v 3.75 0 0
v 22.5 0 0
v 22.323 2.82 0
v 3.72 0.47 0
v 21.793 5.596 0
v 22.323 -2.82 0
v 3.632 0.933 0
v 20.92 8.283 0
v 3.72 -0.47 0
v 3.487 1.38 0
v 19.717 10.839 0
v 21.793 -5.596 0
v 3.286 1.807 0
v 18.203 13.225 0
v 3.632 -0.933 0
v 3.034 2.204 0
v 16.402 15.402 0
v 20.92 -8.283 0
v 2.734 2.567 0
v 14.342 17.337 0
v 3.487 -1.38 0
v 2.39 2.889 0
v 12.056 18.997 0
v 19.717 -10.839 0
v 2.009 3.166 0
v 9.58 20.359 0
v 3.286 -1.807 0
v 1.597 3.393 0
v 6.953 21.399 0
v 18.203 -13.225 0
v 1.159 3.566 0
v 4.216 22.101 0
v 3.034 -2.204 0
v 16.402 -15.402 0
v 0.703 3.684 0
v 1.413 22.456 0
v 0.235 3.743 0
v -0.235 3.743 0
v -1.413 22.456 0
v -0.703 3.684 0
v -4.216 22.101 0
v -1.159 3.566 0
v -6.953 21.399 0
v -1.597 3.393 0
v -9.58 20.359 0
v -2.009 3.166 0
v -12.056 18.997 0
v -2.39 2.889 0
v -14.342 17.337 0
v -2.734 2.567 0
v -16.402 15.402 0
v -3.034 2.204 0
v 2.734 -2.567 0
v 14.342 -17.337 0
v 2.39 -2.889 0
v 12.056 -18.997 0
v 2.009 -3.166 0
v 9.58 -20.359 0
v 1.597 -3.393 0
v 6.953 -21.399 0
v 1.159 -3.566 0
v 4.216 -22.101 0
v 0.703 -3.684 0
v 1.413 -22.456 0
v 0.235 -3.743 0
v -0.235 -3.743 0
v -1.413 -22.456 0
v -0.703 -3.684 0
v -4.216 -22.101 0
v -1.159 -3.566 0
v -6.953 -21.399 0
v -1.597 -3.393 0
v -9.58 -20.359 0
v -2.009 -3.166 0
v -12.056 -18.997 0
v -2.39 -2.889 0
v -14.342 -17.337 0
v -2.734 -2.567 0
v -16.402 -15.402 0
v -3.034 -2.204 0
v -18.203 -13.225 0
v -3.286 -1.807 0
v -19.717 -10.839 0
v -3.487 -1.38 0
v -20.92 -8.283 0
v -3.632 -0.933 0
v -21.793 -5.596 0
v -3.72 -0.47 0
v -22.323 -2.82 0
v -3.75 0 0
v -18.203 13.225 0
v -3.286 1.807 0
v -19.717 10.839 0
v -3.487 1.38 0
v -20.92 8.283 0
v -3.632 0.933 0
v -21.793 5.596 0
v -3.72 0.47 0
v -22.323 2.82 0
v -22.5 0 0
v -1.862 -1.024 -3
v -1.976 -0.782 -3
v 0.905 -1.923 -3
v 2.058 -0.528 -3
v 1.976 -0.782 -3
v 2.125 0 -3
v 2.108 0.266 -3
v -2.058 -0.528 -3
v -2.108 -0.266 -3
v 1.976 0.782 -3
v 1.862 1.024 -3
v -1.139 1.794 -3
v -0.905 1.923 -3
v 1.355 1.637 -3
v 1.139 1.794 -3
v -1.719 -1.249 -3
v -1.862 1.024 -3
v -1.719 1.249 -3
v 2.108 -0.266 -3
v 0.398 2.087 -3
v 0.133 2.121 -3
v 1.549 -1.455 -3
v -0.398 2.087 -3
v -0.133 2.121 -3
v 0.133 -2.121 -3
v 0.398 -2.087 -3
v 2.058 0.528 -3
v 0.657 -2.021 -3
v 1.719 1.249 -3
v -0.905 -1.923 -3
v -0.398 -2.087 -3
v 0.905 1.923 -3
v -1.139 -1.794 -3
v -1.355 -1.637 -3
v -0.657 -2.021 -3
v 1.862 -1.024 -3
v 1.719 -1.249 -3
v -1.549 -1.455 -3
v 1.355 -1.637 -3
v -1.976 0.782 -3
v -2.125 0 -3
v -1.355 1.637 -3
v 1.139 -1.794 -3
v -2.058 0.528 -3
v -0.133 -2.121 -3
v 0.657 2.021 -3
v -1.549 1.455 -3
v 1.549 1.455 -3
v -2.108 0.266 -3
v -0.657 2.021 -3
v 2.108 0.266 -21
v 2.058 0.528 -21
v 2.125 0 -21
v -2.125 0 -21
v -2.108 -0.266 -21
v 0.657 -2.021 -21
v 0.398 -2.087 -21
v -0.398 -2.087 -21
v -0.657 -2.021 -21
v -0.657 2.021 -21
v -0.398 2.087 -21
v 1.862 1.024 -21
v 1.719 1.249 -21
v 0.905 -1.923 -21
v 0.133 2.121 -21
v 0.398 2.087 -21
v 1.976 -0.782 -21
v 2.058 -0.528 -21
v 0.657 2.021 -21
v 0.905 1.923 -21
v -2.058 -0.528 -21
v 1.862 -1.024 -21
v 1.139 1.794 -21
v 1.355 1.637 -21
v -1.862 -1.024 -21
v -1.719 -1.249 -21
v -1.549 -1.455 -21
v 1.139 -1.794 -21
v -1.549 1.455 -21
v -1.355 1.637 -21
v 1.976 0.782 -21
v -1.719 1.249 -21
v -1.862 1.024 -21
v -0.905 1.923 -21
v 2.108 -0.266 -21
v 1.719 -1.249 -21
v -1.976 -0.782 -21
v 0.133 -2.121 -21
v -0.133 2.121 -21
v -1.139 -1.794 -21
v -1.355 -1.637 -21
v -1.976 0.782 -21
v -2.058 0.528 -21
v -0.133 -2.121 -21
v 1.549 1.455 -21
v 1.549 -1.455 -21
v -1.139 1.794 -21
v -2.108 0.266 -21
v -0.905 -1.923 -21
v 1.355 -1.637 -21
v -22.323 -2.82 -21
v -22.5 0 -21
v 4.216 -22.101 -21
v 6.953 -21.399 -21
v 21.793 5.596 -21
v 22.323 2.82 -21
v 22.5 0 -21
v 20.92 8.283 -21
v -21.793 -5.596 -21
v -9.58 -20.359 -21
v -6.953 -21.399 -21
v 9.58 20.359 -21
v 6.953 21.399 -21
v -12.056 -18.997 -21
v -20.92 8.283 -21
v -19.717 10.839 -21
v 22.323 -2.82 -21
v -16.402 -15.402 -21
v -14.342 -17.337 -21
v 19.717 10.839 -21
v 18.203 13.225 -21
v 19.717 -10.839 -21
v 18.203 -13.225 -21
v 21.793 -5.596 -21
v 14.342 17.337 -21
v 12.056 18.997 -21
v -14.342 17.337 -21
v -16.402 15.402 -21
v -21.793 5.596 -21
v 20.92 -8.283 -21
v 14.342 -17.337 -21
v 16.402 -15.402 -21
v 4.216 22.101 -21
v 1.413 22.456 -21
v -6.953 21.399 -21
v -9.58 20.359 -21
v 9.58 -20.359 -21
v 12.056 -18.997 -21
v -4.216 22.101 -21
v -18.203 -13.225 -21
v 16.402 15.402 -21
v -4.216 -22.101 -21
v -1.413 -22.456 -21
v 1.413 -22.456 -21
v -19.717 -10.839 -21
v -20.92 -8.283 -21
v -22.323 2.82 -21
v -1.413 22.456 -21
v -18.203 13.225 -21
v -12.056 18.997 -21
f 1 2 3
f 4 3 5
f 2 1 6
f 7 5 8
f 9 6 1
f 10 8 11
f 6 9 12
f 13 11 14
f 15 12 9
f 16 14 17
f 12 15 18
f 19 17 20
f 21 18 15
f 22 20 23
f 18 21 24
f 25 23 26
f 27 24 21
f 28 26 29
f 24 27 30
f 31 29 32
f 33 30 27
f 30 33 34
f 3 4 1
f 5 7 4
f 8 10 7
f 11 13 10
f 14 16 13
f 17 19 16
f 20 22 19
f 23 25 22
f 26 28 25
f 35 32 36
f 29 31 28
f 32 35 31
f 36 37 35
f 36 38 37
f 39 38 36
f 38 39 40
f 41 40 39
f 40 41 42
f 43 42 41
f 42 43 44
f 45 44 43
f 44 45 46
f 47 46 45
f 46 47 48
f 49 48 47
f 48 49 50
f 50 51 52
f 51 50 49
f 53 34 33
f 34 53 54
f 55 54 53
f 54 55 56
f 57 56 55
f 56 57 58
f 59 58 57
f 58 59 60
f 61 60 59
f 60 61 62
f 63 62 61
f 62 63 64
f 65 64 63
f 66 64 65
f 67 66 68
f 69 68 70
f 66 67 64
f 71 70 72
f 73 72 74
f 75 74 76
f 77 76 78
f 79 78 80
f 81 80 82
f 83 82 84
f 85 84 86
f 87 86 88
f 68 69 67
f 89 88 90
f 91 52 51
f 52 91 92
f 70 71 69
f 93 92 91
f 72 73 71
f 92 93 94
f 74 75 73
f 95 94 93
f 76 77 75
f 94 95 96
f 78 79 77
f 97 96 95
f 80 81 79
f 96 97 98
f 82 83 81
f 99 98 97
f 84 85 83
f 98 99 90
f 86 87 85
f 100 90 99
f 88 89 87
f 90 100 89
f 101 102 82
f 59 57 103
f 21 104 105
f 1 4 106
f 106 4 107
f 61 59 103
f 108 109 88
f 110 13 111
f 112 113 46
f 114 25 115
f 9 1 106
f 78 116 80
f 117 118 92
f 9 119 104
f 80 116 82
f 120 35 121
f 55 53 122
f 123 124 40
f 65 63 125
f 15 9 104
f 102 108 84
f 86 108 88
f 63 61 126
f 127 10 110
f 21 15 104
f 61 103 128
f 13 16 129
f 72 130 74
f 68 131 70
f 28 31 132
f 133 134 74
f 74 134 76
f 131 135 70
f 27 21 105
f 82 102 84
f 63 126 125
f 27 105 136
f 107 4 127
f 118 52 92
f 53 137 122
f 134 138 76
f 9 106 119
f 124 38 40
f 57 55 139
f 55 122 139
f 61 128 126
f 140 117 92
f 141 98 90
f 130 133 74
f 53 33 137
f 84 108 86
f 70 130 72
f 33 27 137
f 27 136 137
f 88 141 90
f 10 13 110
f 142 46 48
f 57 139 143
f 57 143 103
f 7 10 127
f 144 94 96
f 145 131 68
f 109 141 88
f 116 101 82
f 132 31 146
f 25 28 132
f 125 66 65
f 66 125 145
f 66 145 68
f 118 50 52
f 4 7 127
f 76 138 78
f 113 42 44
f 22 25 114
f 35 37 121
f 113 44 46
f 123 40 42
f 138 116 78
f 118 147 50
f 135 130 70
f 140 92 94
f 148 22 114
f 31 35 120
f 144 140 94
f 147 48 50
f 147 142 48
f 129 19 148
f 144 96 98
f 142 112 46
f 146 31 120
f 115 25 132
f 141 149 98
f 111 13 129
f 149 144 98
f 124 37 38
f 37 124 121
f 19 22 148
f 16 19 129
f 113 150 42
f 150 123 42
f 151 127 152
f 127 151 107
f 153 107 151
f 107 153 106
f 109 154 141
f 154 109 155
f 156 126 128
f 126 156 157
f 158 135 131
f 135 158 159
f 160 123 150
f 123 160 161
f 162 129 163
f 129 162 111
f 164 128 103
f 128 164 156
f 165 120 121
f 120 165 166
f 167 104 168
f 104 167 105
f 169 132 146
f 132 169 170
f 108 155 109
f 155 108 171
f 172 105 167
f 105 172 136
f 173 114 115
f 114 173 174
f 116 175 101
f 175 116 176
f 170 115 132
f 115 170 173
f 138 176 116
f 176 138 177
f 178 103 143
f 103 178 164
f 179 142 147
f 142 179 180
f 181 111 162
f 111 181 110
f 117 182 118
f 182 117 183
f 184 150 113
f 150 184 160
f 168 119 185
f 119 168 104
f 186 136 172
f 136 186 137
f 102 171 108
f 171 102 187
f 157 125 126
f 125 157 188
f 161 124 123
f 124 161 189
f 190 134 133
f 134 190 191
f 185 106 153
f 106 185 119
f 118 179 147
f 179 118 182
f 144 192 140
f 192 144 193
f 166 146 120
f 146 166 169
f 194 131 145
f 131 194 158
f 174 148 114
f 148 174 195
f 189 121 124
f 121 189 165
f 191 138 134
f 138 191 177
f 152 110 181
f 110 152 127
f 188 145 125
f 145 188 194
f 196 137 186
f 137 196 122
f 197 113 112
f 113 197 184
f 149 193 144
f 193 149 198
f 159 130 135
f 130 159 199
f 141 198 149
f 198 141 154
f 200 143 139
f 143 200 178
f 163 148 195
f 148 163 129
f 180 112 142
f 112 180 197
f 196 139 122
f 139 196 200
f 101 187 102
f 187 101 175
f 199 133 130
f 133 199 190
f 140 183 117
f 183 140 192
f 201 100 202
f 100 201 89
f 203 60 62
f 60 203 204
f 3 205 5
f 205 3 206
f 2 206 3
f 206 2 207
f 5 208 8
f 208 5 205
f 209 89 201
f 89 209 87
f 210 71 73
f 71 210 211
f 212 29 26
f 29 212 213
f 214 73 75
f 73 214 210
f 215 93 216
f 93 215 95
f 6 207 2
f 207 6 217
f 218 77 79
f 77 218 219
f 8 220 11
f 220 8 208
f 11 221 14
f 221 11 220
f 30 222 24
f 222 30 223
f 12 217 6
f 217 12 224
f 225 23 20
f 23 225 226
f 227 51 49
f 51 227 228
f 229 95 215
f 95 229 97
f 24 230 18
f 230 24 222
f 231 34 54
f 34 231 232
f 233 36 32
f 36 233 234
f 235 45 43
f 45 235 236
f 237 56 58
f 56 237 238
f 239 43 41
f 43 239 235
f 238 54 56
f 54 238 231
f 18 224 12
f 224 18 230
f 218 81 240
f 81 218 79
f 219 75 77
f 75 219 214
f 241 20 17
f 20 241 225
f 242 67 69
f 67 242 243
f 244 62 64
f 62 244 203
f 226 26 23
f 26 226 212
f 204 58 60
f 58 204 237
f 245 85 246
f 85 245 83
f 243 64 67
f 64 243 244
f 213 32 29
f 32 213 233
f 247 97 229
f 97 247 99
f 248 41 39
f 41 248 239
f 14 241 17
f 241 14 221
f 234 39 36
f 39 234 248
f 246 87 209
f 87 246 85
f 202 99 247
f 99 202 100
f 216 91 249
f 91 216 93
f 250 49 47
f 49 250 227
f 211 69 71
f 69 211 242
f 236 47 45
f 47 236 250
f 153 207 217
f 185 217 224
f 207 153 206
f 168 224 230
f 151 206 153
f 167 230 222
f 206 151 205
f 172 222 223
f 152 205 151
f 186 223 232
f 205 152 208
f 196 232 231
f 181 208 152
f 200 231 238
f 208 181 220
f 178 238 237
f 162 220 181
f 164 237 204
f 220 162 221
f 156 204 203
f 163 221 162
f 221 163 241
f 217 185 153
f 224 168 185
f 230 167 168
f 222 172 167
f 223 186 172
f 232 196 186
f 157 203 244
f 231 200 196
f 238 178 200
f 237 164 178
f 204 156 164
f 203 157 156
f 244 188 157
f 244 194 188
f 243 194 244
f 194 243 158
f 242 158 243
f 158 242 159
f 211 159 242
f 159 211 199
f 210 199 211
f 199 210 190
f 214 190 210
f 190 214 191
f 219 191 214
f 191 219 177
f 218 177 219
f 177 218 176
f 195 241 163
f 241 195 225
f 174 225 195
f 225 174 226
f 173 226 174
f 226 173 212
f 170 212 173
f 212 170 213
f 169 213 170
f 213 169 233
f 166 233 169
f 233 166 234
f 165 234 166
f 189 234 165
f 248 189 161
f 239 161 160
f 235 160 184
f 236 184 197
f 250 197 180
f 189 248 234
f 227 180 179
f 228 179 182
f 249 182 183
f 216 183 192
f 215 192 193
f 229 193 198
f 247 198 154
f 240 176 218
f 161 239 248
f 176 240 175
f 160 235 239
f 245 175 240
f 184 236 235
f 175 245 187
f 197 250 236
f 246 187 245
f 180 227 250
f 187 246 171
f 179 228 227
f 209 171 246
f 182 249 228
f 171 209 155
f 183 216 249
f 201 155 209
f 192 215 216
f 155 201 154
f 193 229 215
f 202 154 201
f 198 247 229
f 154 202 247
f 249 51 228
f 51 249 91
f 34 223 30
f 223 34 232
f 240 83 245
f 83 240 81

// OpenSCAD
$fn = 50;

difference() {
	union() {
		translate(v = [0, 0, -21.0]) {
			cylinder(h = 21, r = 22.5);
		}
	}
	union() {
		translate(v = [0, 0, 0]) {
			rotate(a = [0, 0, 0]) {
				difference() {
					union() {
						translate(v = [0, 0, -24.0]) {
							cylinder(h = 24, r = 2.0);
						}
						translate(v = [0, 0, -3]) {
							cylinder(h = 3, r1 = 2.125, r2 = 3.75);
						}
						translate(v = [0, 0, -24.0]) {
							cylinder(h = 24, r = 2.125);
						}
						translate(v = [0, 0, -24.0]) {
							cylinder(h = 24, r = 2.0);
						}
					}
					union();
				}
			}
		}
	}
}
